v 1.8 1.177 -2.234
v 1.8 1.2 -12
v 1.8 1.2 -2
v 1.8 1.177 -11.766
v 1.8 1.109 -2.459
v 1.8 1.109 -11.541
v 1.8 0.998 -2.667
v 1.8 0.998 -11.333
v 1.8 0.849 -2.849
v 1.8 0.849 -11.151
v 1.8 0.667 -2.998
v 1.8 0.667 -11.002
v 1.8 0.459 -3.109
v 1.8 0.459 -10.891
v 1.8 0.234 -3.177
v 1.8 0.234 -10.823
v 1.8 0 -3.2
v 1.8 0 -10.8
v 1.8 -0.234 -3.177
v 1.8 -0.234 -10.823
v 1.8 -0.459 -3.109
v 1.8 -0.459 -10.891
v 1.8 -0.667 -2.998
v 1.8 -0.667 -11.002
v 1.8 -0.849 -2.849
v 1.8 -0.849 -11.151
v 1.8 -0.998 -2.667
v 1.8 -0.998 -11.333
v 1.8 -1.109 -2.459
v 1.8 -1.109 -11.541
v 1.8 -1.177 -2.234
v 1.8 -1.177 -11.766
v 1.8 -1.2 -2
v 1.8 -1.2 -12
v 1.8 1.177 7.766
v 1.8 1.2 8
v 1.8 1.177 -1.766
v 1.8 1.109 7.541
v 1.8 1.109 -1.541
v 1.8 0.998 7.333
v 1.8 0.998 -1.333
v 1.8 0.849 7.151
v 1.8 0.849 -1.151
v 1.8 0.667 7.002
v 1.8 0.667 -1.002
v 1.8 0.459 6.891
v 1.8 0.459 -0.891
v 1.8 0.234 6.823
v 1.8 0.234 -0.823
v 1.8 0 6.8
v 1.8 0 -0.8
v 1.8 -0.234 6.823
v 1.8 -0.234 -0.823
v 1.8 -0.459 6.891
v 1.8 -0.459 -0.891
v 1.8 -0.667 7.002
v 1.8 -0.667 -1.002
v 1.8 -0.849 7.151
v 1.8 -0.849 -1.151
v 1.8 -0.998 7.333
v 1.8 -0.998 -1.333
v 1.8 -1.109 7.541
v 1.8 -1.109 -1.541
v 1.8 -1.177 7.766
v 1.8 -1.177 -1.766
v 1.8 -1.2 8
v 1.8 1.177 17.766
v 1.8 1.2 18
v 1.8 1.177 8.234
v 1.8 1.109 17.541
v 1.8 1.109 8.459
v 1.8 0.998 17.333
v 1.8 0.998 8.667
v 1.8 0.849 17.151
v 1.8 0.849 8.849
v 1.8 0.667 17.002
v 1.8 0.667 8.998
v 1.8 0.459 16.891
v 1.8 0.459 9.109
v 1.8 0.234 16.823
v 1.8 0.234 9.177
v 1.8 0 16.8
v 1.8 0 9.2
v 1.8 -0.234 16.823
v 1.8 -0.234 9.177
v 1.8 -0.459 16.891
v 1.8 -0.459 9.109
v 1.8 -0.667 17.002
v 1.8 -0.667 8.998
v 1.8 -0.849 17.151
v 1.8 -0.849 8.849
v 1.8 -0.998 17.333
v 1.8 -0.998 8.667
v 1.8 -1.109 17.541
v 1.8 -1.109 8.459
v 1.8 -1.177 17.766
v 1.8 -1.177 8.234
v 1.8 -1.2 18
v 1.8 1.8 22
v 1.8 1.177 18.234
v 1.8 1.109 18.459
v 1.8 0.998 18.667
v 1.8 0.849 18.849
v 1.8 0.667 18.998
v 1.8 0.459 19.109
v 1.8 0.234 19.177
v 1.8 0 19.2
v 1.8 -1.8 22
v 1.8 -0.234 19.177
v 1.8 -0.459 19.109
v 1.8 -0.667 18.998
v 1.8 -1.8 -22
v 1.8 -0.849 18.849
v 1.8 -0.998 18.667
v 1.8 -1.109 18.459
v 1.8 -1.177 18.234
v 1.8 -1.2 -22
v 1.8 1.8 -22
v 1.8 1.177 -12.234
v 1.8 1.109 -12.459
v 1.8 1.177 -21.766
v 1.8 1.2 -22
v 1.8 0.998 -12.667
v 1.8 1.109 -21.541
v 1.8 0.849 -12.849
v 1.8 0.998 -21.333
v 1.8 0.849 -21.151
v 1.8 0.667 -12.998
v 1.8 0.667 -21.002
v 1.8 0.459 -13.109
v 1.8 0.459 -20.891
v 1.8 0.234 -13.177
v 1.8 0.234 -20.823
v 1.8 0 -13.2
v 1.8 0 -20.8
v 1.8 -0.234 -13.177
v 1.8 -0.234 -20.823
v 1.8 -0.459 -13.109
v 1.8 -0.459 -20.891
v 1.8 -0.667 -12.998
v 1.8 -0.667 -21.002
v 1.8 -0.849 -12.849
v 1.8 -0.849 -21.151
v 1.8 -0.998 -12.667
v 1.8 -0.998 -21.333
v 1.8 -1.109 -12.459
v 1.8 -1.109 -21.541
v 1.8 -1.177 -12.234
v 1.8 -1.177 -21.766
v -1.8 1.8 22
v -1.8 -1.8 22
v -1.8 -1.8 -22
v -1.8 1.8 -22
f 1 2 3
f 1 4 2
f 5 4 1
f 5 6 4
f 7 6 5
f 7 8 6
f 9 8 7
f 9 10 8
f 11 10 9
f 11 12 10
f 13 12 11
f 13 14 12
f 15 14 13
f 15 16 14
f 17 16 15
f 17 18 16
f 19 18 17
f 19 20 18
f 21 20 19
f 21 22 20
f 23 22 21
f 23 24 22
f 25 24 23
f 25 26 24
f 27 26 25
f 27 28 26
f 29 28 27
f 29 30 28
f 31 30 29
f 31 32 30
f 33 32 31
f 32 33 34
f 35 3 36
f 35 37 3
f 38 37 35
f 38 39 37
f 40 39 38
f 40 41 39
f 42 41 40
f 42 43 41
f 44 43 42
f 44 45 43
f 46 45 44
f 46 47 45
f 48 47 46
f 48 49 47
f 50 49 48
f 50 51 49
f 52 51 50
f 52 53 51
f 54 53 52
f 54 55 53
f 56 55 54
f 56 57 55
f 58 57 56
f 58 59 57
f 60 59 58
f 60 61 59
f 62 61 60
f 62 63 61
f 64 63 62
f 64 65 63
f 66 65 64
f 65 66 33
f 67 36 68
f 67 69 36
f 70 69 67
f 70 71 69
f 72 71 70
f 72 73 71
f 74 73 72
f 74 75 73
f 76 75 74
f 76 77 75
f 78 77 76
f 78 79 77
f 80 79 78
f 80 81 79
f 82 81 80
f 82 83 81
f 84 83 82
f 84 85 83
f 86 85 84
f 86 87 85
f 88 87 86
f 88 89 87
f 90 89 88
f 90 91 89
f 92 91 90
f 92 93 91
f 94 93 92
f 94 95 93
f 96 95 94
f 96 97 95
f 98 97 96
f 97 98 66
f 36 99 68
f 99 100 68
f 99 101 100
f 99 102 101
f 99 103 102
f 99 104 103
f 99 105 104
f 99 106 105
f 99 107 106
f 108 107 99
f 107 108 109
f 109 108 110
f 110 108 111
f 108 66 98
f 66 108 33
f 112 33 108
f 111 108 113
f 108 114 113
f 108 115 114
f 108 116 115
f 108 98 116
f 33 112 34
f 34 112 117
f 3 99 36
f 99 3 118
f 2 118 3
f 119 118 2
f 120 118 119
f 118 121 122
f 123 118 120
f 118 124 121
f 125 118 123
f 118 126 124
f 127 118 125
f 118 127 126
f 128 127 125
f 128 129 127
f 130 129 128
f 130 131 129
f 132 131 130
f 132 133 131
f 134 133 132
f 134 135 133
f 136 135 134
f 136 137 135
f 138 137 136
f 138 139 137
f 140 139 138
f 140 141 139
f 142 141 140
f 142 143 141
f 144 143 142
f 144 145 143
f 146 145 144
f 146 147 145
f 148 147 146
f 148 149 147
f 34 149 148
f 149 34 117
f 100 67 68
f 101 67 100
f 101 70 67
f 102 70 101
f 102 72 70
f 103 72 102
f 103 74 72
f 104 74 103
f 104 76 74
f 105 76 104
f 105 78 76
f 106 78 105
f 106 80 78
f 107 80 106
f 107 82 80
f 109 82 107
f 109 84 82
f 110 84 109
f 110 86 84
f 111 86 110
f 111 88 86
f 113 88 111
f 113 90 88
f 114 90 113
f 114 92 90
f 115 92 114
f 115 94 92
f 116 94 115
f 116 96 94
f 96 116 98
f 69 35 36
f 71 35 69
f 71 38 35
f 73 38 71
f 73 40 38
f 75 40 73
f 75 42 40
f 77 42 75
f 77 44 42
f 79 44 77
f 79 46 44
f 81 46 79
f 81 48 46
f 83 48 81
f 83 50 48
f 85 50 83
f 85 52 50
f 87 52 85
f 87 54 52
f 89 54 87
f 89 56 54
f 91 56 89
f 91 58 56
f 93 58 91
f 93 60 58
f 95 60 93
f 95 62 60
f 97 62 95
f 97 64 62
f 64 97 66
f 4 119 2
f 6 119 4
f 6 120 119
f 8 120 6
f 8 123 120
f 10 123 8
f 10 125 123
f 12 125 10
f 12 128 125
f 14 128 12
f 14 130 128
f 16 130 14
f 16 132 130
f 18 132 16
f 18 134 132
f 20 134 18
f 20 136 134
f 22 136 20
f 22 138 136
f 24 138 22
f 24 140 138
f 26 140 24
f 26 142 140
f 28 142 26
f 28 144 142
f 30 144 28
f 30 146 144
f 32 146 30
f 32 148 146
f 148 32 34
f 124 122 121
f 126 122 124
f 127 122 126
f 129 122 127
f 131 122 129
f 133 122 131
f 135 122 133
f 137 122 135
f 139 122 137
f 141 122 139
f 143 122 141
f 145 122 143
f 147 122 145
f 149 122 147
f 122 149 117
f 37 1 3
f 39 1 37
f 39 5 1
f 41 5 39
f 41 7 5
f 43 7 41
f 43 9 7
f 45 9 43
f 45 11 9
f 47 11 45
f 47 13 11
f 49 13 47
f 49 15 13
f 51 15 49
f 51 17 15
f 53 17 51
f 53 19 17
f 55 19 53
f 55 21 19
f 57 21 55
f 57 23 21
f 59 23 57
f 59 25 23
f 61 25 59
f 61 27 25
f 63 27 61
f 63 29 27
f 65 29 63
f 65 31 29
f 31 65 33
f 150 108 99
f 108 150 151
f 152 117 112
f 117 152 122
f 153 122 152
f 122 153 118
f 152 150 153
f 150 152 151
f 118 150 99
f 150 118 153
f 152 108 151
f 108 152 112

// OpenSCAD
// DND-76 — S6-LC-with-primitives unit cell (P1 bistable latch + P3 pocket/guide).
//
// EVIDENCE CLASS: CAD geometry (this file + its real-OpenSCAD render). It is
// NOT a print and NOT a measurement ([DND-27]).
//
// Rendered by ../tools/render_primitives_cad.py with `-D part="<key>"`.
// Single-manifold parts ("column", "pawl", "latch") are mesh-gated; the
// "cell"/"strip" bodies are multi-solid VIEWING assemblies and are excluded
// from the watertight gate (they overlap by design).
//
// The feature-vs-process checks for this cell live in `../primitives.py`
// (bistable_snap / lane_budget / pocket_throat / guide_budget /
// pocket_load_path), asserted by `../primitives_checks.py`, against the
// published FDM limits in tools/fdm-limits/fdm_process_limits.py.
//
// Units: mm. Target process: Bambu X1C, PLA, 0.4 mm nozzle, 0.20 mm layers.

PITCH = 5.08;
COLUMN_BODY = 3.60;
LANE = PITCH - COLUMN_BODY;        // 1.48 mm
LEVELS = 5;
STEP = 10.0;
COLUMN_H = 44.0;

// P3: rack pocket + guide
POCKET_DEPTH = 1.20;
POCKET_WIDTH = 2.40;
POCKET_RELIEF_DEG = 30.0;
POCKET_FLOOR = 0.88;
V_GUIDE_RAIL_T = 0.88;

// P1/P3: pawl
PAWL_T = 0.80;
PAWL_TOE = 0.60;
PAWL_LEN = 5.00;
PAWL_DEFLECT = 0.35;

// P1: bistable over-centre link
LATCH_T = 0.90;
LATCH_W = 0.70;
LATCH_L = 5.00;
LATCH_OVER_CENTRE = 0.40;

module column_body() {
    difference() {
        cube([COLUMN_BODY, COLUMN_BODY, COLUMN_H], center = true);
        for (lvl = [0 : LEVELS - 1]) rack_pocket_cut(lvl);
    }
}

module rack_pocket_cut(level) {
    z = -22.0 + level * STEP;
    translate([COLUMN_BODY / 2, 0, z])
        rotate([0, 90, 0])
            cylinder(h = POCKET_DEPTH + 0.01, d = POCKET_WIDTH, $fn = 32);
}

module v_guide_rails() {
    for (s = [1, -1])
        translate([s * (COLUMN_BODY + LANE - V_GUIDE_RAIL_T) / 2, 0, 20.0])
            cube([V_GUIDE_RAIL_T, COLUMN_BODY, 6.0], center = true);
}

module pawl() {
    // Z cantilever in the lane, toe toward the column.
    translate([(COLUMN_BODY + PAWL_T) / 2, 0, -18.0])
        cube([PAWL_T, PAWL_TOE, PAWL_LEN], center = true);
}

module latch() {
    // Over-centre link above the pawl in Z, same lane.
    translate([(COLUMN_BODY + LATCH_T) / 2, 0, 12.0])
        cube([LATCH_T, LATCH_W, LATCH_L], center = true);
}

module cell() {
    column_body();
    v_guide_rails();
    pawl();
    latch();
}

module strip() {
    for (i = [0 : 2]) translate([i * PITCH, 0, 0]) cell();
}

part = "column";
if (part == "column") column_body();
else if (part == "pawl") pawl();
else if (part == "latch") latch();
else if (part == "cell") cell();
else if (part == "strip") strip();
else echo("unknown part");
